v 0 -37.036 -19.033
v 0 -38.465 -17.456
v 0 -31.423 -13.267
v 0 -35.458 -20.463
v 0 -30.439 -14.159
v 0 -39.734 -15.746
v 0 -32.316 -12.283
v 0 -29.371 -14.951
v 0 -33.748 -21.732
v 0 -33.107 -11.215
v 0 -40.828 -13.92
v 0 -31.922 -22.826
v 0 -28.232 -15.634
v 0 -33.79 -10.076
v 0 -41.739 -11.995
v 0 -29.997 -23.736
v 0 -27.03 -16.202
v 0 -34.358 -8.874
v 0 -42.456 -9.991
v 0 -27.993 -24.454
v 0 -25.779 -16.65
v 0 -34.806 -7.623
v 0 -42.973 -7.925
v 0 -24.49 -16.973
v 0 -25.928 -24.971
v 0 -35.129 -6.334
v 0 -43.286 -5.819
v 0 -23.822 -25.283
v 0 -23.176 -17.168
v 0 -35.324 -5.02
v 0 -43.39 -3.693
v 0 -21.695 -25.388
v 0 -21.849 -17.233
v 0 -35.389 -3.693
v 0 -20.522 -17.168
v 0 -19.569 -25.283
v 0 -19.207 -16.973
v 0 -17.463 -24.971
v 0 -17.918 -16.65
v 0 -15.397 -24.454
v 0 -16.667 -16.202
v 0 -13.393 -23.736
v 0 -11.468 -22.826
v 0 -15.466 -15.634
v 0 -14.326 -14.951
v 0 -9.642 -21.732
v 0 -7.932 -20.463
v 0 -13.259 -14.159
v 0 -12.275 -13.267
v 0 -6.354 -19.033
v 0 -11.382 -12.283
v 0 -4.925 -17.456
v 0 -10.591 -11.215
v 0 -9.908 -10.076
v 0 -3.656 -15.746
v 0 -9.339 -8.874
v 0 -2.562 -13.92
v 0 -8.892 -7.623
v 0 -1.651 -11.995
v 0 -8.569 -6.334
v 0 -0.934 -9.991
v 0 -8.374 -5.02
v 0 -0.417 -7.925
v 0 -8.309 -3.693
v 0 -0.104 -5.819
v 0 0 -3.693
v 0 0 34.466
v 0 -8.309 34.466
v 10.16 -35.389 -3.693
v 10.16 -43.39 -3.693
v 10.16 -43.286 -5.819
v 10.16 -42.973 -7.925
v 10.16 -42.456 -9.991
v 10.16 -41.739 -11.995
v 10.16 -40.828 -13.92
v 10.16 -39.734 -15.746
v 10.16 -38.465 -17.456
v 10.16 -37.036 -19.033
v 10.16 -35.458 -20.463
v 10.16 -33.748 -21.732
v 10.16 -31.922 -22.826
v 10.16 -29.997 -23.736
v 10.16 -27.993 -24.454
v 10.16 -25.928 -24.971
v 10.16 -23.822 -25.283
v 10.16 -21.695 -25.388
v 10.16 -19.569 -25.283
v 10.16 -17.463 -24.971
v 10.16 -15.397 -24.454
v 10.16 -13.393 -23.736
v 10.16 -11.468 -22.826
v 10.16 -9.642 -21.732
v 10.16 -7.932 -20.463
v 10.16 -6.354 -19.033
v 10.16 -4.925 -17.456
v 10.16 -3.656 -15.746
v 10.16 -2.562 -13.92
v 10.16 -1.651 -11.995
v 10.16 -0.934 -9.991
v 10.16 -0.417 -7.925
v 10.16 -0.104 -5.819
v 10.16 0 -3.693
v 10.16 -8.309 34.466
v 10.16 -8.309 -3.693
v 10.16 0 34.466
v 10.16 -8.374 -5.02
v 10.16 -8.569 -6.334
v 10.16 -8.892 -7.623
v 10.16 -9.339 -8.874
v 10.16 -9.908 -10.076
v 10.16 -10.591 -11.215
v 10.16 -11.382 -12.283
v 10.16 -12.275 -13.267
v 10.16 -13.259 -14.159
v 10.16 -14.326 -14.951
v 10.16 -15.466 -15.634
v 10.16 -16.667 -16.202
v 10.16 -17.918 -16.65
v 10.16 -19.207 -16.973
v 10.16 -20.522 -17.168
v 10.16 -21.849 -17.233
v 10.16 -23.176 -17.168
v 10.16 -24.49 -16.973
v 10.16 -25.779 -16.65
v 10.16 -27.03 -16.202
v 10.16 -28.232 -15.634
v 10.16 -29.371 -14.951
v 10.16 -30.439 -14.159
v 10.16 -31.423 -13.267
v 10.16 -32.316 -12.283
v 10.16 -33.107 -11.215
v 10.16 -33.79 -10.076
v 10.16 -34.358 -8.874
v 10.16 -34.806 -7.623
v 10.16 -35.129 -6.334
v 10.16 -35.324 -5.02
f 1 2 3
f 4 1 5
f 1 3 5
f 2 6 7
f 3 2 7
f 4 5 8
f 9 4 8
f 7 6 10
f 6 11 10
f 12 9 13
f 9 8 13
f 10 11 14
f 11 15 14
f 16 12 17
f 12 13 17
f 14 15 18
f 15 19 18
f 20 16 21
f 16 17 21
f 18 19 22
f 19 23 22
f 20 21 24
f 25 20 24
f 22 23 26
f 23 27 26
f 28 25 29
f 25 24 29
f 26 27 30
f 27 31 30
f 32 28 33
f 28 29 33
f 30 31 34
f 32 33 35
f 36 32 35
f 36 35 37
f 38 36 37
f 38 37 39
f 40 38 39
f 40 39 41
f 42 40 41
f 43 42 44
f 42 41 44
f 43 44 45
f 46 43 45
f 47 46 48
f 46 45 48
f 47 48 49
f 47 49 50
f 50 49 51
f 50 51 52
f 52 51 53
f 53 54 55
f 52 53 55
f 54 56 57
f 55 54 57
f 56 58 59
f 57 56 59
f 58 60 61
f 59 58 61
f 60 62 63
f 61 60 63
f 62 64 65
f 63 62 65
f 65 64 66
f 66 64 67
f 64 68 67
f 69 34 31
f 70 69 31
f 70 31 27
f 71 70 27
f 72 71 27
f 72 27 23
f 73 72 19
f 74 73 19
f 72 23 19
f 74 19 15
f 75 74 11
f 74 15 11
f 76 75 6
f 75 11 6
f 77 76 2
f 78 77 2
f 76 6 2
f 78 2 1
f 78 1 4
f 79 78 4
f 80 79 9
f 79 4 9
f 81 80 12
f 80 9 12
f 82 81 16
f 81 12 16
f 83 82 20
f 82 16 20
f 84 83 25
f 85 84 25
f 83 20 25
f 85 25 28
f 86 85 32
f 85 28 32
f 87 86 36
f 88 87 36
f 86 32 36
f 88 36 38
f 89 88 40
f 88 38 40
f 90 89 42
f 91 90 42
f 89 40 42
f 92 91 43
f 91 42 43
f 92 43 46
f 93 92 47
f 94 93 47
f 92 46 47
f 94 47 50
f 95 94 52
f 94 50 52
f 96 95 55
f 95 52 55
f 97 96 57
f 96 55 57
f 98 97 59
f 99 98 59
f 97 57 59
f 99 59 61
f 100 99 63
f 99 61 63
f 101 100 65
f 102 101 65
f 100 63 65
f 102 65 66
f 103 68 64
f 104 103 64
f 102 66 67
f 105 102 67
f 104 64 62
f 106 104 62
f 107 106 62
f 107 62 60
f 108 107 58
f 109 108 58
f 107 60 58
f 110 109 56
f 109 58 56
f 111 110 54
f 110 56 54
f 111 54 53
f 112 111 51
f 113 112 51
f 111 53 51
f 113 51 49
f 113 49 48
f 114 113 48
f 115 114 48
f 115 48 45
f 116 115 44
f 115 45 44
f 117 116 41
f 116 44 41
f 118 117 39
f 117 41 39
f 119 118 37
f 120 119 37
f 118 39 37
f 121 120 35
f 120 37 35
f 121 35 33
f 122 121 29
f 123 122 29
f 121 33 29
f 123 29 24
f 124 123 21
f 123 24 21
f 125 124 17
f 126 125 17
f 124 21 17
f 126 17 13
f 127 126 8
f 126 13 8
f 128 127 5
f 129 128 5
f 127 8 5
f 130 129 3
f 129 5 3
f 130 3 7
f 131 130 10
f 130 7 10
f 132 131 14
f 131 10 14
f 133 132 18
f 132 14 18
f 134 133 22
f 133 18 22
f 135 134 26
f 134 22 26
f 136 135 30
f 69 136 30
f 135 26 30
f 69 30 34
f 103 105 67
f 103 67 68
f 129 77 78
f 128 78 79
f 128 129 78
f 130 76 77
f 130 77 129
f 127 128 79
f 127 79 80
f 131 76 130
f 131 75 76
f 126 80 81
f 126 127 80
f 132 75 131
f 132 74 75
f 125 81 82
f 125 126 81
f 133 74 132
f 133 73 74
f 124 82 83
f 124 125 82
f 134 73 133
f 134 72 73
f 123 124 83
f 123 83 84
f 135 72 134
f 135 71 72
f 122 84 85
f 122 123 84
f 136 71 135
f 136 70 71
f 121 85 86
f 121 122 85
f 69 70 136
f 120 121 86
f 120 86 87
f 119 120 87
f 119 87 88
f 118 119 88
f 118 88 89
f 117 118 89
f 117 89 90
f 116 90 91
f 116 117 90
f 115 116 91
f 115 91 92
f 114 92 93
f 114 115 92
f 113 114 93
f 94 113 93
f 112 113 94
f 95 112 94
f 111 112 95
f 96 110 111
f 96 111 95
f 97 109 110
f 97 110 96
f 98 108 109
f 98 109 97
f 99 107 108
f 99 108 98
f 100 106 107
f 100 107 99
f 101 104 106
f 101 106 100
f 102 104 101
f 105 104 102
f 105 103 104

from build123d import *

# Parameters (mm, degrees)
F1_DEPTH = 10.16


with BuildPart() as f1:
    # F0 (on Right) → F1 (new body)
    with BuildSketch(Plane.YZ):
        with BuildLine():
            Line((0, -3.692769), (0, 34.465846))
            Line((0, 34.465846), (-8.308733, 34.465846))
            Line((-8.308733, 34.465846), (-8.308733, -3.692769))
            ThreePointArc((-8.308733, -3.692769), (-21.848886, -17.232923), (-35.38904, -3.692769))
            Line((-35.38904, -3.692769), (-43.390039, -3.692769))
            ThreePointArc((-43.390039, -3.692769), (-21.69502, -25.387789), (0, -3.692769))
        make_face()
    extrude(amount=F1_DEPTH)


solid = f1.part
